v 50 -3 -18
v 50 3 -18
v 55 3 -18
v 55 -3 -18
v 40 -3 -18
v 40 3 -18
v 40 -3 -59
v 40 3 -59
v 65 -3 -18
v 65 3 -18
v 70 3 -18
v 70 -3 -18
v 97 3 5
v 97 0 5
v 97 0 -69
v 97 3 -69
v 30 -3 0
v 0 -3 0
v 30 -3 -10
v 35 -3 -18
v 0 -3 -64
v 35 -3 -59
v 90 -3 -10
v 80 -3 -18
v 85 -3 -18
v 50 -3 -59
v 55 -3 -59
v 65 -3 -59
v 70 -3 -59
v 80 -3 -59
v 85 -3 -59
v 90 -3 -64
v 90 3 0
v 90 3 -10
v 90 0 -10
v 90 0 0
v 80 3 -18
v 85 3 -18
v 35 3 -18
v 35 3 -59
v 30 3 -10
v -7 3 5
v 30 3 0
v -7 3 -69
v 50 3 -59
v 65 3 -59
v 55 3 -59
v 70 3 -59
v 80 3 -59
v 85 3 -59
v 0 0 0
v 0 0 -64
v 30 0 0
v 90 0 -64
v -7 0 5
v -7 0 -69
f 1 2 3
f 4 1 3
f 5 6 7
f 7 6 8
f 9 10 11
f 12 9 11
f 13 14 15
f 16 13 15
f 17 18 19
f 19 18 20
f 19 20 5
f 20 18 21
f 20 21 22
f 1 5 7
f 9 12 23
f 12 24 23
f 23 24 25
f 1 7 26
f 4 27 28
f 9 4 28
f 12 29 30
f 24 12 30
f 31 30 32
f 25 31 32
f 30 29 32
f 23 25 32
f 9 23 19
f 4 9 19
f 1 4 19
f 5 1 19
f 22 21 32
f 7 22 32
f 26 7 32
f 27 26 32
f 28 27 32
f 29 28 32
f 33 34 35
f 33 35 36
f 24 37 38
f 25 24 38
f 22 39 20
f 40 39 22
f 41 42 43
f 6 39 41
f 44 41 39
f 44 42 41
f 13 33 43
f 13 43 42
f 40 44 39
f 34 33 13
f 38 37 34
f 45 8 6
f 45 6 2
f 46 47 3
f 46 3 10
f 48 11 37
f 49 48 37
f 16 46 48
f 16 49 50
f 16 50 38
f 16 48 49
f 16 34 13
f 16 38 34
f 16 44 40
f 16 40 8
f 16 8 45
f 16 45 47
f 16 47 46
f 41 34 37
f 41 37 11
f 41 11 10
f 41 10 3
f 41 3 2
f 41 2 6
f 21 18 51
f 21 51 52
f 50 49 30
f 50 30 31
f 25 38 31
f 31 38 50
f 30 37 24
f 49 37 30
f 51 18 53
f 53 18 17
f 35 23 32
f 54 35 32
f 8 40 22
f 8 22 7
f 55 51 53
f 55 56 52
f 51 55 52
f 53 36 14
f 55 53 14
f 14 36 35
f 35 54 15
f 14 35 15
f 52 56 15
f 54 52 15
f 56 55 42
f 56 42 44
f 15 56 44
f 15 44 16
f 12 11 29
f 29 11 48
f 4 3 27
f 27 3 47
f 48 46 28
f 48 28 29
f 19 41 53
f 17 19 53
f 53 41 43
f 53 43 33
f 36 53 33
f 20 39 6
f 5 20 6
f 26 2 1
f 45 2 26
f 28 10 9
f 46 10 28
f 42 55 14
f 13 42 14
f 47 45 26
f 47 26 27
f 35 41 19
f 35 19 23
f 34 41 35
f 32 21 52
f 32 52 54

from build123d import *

# Parameters (mm, degrees)
BOSS_EXTRUDE1_DEPTH      = 3
BOSS_EXTRUDE1_DEPTH_BACK = 3
SKETCH1_W                = 90
SKETCH1_H                = 64
SKETCH1_4_W              = 104
SKETCH1_4_H              = 74
SKETCH1_4_W_2            = 90
SKETCH1_4_H_2            = 64
BOSS_EXTRUDE3_DEPTH      = 3
CUT_EXTRUDE1_DEPTH       = 120.18892566
CUT_EXTRUDE1_DEPTH_BACK  = 120.18892566
SKETCH2_W                = 60
SKETCH2_H                = 10
SKETCH3_W                = 5
SKETCH3_H                = 41
CUT_EXTRUDE2_DEPTH       = 120.18892566


with BuildPart() as part:
    # Sketch1 → Boss-Extrude1 (new, two sides: drawn at the far end of the back side and taken through both)
    with BuildSketch(Plane(origin=(0, 0, 0), x_dir=(1, 0, 0), z_dir=(0, 1, 0)).offset(-BOSS_EXTRUDE1_DEPTH_BACK)):
        with Locations((45, 32)):
            Rectangle(SKETCH1_W, SKETCH1_H)
    extrude(amount=BOSS_EXTRUDE1_DEPTH + BOSS_EXTRUDE1_DEPTH_BACK)

    # Sketch1<4> → Boss-Extrude3 (add)
    with BuildSketch(Plane(origin=(0, 0, 0), x_dir=(1, 0, 0), z_dir=(0, 1, 0))):
        with Locations((45, 32)):
            Rectangle(SKETCH1_4_W, SKETCH1_4_H)
        with Locations((45, 32)):
            Rectangle(SKETCH1_4_W_2, SKETCH1_4_H_2, mode=Mode.SUBTRACT)
    extrude(amount=BOSS_EXTRUDE3_DEPTH)

    # Sketch2 → Cut-Extrude1 (cut, two sides: drawn at the far end of the back side and taken through both)
    with BuildSketch(Plane.XZ.offset(3).offset(-CUT_EXTRUDE1_DEPTH_BACK)):
        with Locations((60, -5)):
            Rectangle(SKETCH2_W, SKETCH2_H)
    extrude(amount=CUT_EXTRUDE1_DEPTH + CUT_EXTRUDE1_DEPTH_BACK, mode=Mode.SUBTRACT)

    # Sketch3 → Cut-Extrude2 (cut, through all)
    with BuildSketch(Plane(origin=(0, 3, 0), x_dir=(1, 0, 0), z_dir=(0, 1, 0))):
        with Locations((37.5, 38.5)):
            Rectangle(SKETCH3_W, SKETCH3_H)
        with Locations((52.5, 38.5)):
            Rectangle(SKETCH3_W, SKETCH3_H)
        with Locations((82.5, 38.5)):
            Rectangle(SKETCH3_W, SKETCH3_H)
        with Locations((67.5, 38.5)):
            Rectangle(SKETCH3_W, SKETCH3_H)
    extrude(amount=-CUT_EXTRUDE2_DEPTH, mode=Mode.SUBTRACT)


solid = part.part
